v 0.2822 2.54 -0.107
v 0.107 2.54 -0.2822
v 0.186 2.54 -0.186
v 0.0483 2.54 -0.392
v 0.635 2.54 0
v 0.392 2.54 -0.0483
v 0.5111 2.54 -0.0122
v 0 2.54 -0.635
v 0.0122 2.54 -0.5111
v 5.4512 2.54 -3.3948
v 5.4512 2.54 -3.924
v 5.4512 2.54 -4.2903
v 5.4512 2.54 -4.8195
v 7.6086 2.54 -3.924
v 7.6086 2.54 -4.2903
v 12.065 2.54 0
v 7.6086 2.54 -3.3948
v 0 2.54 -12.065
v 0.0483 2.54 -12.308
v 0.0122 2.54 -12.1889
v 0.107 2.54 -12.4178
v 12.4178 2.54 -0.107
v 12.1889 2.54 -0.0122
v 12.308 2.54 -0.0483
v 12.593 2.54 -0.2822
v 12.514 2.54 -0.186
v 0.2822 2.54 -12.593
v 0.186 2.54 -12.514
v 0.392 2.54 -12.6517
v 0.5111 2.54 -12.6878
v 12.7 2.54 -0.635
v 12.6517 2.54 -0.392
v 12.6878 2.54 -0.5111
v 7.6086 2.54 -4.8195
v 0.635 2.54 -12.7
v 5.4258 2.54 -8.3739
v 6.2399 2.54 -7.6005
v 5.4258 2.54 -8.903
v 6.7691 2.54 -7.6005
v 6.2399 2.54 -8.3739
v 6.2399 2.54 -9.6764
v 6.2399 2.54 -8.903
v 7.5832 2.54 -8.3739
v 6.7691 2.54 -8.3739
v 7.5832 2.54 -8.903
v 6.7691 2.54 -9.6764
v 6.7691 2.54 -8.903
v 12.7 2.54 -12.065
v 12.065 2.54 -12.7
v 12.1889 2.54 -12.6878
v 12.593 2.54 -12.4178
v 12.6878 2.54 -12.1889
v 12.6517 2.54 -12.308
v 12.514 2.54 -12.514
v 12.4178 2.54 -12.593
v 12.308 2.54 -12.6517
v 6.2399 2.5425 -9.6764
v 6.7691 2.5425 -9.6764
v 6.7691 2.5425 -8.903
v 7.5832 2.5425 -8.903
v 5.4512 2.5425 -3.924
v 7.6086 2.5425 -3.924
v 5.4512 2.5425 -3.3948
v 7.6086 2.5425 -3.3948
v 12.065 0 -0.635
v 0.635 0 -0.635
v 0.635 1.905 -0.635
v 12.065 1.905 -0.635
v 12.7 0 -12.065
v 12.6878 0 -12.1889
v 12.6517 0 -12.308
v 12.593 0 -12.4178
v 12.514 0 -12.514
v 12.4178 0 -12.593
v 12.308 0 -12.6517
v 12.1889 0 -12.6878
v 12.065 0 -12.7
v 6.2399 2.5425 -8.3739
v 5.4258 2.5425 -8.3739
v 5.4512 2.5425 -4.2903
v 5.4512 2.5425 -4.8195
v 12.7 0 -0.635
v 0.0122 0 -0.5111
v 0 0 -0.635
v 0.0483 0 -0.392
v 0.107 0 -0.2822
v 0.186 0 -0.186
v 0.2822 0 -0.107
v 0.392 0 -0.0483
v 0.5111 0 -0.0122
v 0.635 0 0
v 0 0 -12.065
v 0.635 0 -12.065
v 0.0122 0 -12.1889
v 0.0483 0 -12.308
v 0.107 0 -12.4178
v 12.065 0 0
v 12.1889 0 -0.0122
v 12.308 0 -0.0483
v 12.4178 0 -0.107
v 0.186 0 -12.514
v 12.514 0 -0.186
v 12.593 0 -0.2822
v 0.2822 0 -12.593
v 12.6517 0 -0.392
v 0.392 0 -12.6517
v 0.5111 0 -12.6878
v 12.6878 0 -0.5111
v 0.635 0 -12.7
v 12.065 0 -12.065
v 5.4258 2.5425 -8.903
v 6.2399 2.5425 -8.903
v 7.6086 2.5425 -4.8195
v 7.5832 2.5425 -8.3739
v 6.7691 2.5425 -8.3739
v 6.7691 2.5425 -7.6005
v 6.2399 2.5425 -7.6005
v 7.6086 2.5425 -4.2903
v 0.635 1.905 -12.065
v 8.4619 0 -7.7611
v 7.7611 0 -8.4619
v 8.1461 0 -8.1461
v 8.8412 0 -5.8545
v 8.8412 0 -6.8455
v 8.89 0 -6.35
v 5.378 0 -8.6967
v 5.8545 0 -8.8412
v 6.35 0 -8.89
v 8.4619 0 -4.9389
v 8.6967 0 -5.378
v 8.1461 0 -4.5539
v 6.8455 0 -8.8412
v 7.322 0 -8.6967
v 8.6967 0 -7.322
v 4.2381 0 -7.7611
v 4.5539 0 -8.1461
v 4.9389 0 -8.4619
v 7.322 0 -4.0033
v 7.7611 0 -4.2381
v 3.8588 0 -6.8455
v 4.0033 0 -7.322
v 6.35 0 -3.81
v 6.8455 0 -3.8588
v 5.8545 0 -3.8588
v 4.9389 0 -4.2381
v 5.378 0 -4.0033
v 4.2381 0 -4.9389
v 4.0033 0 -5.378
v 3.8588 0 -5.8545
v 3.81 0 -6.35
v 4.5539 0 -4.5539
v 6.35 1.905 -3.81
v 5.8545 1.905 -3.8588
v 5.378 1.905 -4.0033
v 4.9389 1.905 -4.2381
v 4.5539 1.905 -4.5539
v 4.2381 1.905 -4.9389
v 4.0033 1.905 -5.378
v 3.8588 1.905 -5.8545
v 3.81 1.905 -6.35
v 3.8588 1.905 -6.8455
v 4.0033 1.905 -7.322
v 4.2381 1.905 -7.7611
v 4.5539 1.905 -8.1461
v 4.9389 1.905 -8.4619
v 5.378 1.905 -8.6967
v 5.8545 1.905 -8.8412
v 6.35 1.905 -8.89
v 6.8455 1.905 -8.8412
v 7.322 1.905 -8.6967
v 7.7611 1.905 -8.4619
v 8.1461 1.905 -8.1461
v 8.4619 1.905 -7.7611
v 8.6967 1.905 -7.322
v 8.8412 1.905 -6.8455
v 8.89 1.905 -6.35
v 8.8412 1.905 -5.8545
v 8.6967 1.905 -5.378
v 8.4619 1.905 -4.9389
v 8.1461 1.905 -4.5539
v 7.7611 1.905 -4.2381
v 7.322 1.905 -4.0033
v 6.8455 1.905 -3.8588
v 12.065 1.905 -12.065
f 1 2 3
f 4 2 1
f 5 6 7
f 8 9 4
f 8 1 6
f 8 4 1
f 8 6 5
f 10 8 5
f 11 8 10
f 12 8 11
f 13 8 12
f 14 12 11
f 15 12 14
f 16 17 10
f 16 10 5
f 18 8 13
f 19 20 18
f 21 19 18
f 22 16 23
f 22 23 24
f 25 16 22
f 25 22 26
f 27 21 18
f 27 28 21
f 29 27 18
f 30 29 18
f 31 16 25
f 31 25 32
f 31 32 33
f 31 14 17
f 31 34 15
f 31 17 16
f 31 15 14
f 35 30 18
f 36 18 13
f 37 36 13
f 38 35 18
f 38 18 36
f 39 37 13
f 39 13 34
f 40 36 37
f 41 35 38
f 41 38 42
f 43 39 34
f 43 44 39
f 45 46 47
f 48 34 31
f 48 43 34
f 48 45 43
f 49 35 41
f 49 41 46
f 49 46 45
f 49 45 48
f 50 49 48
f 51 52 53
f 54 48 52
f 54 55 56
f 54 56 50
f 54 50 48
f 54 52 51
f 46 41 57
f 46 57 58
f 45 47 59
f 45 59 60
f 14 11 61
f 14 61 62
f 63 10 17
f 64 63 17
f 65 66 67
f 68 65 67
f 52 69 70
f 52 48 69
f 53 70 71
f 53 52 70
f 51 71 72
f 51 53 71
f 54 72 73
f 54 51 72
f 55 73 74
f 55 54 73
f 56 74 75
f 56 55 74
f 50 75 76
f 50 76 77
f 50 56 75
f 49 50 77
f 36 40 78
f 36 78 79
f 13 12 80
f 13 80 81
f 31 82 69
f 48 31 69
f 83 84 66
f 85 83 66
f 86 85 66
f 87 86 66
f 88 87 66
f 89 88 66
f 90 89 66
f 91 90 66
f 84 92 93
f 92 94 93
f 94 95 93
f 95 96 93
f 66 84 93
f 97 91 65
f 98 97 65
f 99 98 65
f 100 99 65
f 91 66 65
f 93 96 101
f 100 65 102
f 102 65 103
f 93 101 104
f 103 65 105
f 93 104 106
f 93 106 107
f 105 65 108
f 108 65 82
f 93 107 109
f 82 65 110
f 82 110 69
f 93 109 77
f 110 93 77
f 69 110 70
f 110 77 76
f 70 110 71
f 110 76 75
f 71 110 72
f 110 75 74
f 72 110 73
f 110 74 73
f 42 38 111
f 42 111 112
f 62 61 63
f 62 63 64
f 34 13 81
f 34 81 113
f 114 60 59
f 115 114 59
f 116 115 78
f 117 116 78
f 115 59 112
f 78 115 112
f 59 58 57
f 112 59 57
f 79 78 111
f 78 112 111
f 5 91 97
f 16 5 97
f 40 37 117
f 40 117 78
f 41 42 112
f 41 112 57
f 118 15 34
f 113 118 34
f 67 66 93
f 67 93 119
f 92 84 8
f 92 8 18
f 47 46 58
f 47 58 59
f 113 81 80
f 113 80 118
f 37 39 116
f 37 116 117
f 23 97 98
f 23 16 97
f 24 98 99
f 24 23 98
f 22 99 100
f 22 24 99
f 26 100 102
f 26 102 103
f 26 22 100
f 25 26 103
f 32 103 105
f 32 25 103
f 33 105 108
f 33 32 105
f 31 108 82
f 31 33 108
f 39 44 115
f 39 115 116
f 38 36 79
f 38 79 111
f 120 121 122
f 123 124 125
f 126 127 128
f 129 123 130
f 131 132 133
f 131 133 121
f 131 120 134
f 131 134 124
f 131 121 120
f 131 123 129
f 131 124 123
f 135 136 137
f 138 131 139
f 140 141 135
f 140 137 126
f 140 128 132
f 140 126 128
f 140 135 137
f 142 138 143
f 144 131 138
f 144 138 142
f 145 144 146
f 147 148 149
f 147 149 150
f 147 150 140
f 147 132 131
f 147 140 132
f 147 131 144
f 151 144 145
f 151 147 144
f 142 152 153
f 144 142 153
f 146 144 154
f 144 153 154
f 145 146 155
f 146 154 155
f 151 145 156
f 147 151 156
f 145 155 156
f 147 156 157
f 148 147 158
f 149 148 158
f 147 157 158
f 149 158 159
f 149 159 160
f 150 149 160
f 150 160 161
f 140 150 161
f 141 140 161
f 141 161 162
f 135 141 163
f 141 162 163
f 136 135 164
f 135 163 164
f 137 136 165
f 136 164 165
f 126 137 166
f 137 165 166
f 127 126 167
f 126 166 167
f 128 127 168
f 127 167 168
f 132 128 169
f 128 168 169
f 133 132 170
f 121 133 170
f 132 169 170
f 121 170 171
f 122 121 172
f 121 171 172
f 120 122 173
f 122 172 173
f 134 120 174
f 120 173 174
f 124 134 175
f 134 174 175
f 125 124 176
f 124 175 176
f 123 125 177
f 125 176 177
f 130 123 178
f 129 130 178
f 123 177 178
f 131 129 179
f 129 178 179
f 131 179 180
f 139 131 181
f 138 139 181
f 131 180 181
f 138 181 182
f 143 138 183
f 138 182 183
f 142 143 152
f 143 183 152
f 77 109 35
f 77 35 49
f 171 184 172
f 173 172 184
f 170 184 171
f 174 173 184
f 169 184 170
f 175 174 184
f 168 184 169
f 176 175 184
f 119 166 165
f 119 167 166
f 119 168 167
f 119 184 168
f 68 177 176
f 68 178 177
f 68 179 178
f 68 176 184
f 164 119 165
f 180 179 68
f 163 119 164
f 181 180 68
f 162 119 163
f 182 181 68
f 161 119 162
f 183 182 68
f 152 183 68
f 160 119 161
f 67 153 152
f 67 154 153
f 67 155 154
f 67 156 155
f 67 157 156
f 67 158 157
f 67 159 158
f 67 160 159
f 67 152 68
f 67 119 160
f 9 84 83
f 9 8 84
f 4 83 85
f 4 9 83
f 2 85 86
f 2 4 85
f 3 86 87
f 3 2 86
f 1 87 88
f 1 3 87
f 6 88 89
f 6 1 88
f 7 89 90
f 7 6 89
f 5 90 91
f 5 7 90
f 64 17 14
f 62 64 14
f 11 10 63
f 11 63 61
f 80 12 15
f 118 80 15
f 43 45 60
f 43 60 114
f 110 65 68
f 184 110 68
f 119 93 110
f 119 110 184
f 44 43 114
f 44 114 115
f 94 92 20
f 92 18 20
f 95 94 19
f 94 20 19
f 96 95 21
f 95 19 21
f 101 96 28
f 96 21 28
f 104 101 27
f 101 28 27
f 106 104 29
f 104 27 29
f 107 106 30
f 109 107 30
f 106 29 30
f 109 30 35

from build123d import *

# Parameters (mm, degrees)
SKETCH1_W           = 12.7
SKETCH1_H           = 12.7
BOSS_EXTRUDE1_DEPTH = 2.54
FILLET1_R           = 0.635
SHELL1_START        = 0.635
SHELL1_OUTLINE_W    = 1.905
SHELL1_OUTLINE_H    = 11.43
SHELL1_DEPTH        = 11.43
SKETCH2_R           = 2.54
BOSS_EXTRUDE2_DEPTH = 1.905
SKETCH3_W           = 2.157371795
SKETCH3_H           = 0.529166666
SKETCH3_H_2         = 0.529166667
BOSS_EXTRUDE3_DEPTH = 0.00254


# Read off the part's stored shape, not the designer's step: Shell1
with BuildPart() as part:
    # Sketch1 → Boss-Extrude1 (new body)
    with BuildSketch(Plane(origin=(0, 0, 0), x_dir=(1, 0, 0), z_dir=(0, 1, 0))):
        with Locations((6.35, 6.35)):
            Rectangle(SKETCH1_W, SKETCH1_H)
    extrude(amount=BOSS_EXTRUDE1_DEPTH)

    # Fillet1
    fillet1_edges = [part.edges().sort_by_distance(p)[0] for p in [
        (0, 1.27, -12.7),
        (12.7, 1.27, -12.7),
        (12.7, 1.27, 0),
        (0, 1.27, 0),
    ]]
    fillet(fillet1_edges, radius=FILLET1_R)

    # Shell1 outline → Shell1 (cut)
    with BuildSketch(Plane.YZ.offset(SHELL1_START)):
        with Locations((0.9525, -6.35)):
            Rectangle(SHELL1_OUTLINE_W, SHELL1_OUTLINE_H)
    extrude(amount=SHELL1_DEPTH, mode=Mode.SUBTRACT)

    # Sketch2 → Boss-Extrude2 (add)
    with BuildSketch(Plane(origin=(0, 1.905, 0), x_dir=(-1, 0, 0), z_dir=(0, -1, 0))):
        with Locations(Location((-6.35, 6.35, 0), (0, 0, 270))):
            Circle(SKETCH2_R)
    extrude(amount=BOSS_EXTRUDE2_DEPTH)

    # Sketch3 → Boss-Extrude3 (add)
    with BuildSketch(Plane(origin=(0, 2.54, 0), x_dir=(1, 0, 0), z_dir=(0, 1, 0))):
        Polygon((6.239933333, 8.903025641), (6.239933333, 9.676423077), (6.7691, 9.676423077), (6.7691, 8.903025641), (7.583202564, 8.903025641), (7.583202564, 8.373858974), (6.7691, 8.373858974), (6.7691, 7.600461538), (6.239933333, 7.600461538), (6.239933333, 8.373858974), (5.425830769, 8.373858974), (5.425830769, 8.903025641), align=None)
        with Locations((6.529916667, 4.554903846)):
            Rectangle(SKETCH3_W, SKETCH3_H)
        with Locations((6.529916667, 3.659391026)):
            Rectangle(SKETCH3_W, SKETCH3_H_2)
    extrude(amount=BOSS_EXTRUDE3_DEPTH)


solid = part.part
